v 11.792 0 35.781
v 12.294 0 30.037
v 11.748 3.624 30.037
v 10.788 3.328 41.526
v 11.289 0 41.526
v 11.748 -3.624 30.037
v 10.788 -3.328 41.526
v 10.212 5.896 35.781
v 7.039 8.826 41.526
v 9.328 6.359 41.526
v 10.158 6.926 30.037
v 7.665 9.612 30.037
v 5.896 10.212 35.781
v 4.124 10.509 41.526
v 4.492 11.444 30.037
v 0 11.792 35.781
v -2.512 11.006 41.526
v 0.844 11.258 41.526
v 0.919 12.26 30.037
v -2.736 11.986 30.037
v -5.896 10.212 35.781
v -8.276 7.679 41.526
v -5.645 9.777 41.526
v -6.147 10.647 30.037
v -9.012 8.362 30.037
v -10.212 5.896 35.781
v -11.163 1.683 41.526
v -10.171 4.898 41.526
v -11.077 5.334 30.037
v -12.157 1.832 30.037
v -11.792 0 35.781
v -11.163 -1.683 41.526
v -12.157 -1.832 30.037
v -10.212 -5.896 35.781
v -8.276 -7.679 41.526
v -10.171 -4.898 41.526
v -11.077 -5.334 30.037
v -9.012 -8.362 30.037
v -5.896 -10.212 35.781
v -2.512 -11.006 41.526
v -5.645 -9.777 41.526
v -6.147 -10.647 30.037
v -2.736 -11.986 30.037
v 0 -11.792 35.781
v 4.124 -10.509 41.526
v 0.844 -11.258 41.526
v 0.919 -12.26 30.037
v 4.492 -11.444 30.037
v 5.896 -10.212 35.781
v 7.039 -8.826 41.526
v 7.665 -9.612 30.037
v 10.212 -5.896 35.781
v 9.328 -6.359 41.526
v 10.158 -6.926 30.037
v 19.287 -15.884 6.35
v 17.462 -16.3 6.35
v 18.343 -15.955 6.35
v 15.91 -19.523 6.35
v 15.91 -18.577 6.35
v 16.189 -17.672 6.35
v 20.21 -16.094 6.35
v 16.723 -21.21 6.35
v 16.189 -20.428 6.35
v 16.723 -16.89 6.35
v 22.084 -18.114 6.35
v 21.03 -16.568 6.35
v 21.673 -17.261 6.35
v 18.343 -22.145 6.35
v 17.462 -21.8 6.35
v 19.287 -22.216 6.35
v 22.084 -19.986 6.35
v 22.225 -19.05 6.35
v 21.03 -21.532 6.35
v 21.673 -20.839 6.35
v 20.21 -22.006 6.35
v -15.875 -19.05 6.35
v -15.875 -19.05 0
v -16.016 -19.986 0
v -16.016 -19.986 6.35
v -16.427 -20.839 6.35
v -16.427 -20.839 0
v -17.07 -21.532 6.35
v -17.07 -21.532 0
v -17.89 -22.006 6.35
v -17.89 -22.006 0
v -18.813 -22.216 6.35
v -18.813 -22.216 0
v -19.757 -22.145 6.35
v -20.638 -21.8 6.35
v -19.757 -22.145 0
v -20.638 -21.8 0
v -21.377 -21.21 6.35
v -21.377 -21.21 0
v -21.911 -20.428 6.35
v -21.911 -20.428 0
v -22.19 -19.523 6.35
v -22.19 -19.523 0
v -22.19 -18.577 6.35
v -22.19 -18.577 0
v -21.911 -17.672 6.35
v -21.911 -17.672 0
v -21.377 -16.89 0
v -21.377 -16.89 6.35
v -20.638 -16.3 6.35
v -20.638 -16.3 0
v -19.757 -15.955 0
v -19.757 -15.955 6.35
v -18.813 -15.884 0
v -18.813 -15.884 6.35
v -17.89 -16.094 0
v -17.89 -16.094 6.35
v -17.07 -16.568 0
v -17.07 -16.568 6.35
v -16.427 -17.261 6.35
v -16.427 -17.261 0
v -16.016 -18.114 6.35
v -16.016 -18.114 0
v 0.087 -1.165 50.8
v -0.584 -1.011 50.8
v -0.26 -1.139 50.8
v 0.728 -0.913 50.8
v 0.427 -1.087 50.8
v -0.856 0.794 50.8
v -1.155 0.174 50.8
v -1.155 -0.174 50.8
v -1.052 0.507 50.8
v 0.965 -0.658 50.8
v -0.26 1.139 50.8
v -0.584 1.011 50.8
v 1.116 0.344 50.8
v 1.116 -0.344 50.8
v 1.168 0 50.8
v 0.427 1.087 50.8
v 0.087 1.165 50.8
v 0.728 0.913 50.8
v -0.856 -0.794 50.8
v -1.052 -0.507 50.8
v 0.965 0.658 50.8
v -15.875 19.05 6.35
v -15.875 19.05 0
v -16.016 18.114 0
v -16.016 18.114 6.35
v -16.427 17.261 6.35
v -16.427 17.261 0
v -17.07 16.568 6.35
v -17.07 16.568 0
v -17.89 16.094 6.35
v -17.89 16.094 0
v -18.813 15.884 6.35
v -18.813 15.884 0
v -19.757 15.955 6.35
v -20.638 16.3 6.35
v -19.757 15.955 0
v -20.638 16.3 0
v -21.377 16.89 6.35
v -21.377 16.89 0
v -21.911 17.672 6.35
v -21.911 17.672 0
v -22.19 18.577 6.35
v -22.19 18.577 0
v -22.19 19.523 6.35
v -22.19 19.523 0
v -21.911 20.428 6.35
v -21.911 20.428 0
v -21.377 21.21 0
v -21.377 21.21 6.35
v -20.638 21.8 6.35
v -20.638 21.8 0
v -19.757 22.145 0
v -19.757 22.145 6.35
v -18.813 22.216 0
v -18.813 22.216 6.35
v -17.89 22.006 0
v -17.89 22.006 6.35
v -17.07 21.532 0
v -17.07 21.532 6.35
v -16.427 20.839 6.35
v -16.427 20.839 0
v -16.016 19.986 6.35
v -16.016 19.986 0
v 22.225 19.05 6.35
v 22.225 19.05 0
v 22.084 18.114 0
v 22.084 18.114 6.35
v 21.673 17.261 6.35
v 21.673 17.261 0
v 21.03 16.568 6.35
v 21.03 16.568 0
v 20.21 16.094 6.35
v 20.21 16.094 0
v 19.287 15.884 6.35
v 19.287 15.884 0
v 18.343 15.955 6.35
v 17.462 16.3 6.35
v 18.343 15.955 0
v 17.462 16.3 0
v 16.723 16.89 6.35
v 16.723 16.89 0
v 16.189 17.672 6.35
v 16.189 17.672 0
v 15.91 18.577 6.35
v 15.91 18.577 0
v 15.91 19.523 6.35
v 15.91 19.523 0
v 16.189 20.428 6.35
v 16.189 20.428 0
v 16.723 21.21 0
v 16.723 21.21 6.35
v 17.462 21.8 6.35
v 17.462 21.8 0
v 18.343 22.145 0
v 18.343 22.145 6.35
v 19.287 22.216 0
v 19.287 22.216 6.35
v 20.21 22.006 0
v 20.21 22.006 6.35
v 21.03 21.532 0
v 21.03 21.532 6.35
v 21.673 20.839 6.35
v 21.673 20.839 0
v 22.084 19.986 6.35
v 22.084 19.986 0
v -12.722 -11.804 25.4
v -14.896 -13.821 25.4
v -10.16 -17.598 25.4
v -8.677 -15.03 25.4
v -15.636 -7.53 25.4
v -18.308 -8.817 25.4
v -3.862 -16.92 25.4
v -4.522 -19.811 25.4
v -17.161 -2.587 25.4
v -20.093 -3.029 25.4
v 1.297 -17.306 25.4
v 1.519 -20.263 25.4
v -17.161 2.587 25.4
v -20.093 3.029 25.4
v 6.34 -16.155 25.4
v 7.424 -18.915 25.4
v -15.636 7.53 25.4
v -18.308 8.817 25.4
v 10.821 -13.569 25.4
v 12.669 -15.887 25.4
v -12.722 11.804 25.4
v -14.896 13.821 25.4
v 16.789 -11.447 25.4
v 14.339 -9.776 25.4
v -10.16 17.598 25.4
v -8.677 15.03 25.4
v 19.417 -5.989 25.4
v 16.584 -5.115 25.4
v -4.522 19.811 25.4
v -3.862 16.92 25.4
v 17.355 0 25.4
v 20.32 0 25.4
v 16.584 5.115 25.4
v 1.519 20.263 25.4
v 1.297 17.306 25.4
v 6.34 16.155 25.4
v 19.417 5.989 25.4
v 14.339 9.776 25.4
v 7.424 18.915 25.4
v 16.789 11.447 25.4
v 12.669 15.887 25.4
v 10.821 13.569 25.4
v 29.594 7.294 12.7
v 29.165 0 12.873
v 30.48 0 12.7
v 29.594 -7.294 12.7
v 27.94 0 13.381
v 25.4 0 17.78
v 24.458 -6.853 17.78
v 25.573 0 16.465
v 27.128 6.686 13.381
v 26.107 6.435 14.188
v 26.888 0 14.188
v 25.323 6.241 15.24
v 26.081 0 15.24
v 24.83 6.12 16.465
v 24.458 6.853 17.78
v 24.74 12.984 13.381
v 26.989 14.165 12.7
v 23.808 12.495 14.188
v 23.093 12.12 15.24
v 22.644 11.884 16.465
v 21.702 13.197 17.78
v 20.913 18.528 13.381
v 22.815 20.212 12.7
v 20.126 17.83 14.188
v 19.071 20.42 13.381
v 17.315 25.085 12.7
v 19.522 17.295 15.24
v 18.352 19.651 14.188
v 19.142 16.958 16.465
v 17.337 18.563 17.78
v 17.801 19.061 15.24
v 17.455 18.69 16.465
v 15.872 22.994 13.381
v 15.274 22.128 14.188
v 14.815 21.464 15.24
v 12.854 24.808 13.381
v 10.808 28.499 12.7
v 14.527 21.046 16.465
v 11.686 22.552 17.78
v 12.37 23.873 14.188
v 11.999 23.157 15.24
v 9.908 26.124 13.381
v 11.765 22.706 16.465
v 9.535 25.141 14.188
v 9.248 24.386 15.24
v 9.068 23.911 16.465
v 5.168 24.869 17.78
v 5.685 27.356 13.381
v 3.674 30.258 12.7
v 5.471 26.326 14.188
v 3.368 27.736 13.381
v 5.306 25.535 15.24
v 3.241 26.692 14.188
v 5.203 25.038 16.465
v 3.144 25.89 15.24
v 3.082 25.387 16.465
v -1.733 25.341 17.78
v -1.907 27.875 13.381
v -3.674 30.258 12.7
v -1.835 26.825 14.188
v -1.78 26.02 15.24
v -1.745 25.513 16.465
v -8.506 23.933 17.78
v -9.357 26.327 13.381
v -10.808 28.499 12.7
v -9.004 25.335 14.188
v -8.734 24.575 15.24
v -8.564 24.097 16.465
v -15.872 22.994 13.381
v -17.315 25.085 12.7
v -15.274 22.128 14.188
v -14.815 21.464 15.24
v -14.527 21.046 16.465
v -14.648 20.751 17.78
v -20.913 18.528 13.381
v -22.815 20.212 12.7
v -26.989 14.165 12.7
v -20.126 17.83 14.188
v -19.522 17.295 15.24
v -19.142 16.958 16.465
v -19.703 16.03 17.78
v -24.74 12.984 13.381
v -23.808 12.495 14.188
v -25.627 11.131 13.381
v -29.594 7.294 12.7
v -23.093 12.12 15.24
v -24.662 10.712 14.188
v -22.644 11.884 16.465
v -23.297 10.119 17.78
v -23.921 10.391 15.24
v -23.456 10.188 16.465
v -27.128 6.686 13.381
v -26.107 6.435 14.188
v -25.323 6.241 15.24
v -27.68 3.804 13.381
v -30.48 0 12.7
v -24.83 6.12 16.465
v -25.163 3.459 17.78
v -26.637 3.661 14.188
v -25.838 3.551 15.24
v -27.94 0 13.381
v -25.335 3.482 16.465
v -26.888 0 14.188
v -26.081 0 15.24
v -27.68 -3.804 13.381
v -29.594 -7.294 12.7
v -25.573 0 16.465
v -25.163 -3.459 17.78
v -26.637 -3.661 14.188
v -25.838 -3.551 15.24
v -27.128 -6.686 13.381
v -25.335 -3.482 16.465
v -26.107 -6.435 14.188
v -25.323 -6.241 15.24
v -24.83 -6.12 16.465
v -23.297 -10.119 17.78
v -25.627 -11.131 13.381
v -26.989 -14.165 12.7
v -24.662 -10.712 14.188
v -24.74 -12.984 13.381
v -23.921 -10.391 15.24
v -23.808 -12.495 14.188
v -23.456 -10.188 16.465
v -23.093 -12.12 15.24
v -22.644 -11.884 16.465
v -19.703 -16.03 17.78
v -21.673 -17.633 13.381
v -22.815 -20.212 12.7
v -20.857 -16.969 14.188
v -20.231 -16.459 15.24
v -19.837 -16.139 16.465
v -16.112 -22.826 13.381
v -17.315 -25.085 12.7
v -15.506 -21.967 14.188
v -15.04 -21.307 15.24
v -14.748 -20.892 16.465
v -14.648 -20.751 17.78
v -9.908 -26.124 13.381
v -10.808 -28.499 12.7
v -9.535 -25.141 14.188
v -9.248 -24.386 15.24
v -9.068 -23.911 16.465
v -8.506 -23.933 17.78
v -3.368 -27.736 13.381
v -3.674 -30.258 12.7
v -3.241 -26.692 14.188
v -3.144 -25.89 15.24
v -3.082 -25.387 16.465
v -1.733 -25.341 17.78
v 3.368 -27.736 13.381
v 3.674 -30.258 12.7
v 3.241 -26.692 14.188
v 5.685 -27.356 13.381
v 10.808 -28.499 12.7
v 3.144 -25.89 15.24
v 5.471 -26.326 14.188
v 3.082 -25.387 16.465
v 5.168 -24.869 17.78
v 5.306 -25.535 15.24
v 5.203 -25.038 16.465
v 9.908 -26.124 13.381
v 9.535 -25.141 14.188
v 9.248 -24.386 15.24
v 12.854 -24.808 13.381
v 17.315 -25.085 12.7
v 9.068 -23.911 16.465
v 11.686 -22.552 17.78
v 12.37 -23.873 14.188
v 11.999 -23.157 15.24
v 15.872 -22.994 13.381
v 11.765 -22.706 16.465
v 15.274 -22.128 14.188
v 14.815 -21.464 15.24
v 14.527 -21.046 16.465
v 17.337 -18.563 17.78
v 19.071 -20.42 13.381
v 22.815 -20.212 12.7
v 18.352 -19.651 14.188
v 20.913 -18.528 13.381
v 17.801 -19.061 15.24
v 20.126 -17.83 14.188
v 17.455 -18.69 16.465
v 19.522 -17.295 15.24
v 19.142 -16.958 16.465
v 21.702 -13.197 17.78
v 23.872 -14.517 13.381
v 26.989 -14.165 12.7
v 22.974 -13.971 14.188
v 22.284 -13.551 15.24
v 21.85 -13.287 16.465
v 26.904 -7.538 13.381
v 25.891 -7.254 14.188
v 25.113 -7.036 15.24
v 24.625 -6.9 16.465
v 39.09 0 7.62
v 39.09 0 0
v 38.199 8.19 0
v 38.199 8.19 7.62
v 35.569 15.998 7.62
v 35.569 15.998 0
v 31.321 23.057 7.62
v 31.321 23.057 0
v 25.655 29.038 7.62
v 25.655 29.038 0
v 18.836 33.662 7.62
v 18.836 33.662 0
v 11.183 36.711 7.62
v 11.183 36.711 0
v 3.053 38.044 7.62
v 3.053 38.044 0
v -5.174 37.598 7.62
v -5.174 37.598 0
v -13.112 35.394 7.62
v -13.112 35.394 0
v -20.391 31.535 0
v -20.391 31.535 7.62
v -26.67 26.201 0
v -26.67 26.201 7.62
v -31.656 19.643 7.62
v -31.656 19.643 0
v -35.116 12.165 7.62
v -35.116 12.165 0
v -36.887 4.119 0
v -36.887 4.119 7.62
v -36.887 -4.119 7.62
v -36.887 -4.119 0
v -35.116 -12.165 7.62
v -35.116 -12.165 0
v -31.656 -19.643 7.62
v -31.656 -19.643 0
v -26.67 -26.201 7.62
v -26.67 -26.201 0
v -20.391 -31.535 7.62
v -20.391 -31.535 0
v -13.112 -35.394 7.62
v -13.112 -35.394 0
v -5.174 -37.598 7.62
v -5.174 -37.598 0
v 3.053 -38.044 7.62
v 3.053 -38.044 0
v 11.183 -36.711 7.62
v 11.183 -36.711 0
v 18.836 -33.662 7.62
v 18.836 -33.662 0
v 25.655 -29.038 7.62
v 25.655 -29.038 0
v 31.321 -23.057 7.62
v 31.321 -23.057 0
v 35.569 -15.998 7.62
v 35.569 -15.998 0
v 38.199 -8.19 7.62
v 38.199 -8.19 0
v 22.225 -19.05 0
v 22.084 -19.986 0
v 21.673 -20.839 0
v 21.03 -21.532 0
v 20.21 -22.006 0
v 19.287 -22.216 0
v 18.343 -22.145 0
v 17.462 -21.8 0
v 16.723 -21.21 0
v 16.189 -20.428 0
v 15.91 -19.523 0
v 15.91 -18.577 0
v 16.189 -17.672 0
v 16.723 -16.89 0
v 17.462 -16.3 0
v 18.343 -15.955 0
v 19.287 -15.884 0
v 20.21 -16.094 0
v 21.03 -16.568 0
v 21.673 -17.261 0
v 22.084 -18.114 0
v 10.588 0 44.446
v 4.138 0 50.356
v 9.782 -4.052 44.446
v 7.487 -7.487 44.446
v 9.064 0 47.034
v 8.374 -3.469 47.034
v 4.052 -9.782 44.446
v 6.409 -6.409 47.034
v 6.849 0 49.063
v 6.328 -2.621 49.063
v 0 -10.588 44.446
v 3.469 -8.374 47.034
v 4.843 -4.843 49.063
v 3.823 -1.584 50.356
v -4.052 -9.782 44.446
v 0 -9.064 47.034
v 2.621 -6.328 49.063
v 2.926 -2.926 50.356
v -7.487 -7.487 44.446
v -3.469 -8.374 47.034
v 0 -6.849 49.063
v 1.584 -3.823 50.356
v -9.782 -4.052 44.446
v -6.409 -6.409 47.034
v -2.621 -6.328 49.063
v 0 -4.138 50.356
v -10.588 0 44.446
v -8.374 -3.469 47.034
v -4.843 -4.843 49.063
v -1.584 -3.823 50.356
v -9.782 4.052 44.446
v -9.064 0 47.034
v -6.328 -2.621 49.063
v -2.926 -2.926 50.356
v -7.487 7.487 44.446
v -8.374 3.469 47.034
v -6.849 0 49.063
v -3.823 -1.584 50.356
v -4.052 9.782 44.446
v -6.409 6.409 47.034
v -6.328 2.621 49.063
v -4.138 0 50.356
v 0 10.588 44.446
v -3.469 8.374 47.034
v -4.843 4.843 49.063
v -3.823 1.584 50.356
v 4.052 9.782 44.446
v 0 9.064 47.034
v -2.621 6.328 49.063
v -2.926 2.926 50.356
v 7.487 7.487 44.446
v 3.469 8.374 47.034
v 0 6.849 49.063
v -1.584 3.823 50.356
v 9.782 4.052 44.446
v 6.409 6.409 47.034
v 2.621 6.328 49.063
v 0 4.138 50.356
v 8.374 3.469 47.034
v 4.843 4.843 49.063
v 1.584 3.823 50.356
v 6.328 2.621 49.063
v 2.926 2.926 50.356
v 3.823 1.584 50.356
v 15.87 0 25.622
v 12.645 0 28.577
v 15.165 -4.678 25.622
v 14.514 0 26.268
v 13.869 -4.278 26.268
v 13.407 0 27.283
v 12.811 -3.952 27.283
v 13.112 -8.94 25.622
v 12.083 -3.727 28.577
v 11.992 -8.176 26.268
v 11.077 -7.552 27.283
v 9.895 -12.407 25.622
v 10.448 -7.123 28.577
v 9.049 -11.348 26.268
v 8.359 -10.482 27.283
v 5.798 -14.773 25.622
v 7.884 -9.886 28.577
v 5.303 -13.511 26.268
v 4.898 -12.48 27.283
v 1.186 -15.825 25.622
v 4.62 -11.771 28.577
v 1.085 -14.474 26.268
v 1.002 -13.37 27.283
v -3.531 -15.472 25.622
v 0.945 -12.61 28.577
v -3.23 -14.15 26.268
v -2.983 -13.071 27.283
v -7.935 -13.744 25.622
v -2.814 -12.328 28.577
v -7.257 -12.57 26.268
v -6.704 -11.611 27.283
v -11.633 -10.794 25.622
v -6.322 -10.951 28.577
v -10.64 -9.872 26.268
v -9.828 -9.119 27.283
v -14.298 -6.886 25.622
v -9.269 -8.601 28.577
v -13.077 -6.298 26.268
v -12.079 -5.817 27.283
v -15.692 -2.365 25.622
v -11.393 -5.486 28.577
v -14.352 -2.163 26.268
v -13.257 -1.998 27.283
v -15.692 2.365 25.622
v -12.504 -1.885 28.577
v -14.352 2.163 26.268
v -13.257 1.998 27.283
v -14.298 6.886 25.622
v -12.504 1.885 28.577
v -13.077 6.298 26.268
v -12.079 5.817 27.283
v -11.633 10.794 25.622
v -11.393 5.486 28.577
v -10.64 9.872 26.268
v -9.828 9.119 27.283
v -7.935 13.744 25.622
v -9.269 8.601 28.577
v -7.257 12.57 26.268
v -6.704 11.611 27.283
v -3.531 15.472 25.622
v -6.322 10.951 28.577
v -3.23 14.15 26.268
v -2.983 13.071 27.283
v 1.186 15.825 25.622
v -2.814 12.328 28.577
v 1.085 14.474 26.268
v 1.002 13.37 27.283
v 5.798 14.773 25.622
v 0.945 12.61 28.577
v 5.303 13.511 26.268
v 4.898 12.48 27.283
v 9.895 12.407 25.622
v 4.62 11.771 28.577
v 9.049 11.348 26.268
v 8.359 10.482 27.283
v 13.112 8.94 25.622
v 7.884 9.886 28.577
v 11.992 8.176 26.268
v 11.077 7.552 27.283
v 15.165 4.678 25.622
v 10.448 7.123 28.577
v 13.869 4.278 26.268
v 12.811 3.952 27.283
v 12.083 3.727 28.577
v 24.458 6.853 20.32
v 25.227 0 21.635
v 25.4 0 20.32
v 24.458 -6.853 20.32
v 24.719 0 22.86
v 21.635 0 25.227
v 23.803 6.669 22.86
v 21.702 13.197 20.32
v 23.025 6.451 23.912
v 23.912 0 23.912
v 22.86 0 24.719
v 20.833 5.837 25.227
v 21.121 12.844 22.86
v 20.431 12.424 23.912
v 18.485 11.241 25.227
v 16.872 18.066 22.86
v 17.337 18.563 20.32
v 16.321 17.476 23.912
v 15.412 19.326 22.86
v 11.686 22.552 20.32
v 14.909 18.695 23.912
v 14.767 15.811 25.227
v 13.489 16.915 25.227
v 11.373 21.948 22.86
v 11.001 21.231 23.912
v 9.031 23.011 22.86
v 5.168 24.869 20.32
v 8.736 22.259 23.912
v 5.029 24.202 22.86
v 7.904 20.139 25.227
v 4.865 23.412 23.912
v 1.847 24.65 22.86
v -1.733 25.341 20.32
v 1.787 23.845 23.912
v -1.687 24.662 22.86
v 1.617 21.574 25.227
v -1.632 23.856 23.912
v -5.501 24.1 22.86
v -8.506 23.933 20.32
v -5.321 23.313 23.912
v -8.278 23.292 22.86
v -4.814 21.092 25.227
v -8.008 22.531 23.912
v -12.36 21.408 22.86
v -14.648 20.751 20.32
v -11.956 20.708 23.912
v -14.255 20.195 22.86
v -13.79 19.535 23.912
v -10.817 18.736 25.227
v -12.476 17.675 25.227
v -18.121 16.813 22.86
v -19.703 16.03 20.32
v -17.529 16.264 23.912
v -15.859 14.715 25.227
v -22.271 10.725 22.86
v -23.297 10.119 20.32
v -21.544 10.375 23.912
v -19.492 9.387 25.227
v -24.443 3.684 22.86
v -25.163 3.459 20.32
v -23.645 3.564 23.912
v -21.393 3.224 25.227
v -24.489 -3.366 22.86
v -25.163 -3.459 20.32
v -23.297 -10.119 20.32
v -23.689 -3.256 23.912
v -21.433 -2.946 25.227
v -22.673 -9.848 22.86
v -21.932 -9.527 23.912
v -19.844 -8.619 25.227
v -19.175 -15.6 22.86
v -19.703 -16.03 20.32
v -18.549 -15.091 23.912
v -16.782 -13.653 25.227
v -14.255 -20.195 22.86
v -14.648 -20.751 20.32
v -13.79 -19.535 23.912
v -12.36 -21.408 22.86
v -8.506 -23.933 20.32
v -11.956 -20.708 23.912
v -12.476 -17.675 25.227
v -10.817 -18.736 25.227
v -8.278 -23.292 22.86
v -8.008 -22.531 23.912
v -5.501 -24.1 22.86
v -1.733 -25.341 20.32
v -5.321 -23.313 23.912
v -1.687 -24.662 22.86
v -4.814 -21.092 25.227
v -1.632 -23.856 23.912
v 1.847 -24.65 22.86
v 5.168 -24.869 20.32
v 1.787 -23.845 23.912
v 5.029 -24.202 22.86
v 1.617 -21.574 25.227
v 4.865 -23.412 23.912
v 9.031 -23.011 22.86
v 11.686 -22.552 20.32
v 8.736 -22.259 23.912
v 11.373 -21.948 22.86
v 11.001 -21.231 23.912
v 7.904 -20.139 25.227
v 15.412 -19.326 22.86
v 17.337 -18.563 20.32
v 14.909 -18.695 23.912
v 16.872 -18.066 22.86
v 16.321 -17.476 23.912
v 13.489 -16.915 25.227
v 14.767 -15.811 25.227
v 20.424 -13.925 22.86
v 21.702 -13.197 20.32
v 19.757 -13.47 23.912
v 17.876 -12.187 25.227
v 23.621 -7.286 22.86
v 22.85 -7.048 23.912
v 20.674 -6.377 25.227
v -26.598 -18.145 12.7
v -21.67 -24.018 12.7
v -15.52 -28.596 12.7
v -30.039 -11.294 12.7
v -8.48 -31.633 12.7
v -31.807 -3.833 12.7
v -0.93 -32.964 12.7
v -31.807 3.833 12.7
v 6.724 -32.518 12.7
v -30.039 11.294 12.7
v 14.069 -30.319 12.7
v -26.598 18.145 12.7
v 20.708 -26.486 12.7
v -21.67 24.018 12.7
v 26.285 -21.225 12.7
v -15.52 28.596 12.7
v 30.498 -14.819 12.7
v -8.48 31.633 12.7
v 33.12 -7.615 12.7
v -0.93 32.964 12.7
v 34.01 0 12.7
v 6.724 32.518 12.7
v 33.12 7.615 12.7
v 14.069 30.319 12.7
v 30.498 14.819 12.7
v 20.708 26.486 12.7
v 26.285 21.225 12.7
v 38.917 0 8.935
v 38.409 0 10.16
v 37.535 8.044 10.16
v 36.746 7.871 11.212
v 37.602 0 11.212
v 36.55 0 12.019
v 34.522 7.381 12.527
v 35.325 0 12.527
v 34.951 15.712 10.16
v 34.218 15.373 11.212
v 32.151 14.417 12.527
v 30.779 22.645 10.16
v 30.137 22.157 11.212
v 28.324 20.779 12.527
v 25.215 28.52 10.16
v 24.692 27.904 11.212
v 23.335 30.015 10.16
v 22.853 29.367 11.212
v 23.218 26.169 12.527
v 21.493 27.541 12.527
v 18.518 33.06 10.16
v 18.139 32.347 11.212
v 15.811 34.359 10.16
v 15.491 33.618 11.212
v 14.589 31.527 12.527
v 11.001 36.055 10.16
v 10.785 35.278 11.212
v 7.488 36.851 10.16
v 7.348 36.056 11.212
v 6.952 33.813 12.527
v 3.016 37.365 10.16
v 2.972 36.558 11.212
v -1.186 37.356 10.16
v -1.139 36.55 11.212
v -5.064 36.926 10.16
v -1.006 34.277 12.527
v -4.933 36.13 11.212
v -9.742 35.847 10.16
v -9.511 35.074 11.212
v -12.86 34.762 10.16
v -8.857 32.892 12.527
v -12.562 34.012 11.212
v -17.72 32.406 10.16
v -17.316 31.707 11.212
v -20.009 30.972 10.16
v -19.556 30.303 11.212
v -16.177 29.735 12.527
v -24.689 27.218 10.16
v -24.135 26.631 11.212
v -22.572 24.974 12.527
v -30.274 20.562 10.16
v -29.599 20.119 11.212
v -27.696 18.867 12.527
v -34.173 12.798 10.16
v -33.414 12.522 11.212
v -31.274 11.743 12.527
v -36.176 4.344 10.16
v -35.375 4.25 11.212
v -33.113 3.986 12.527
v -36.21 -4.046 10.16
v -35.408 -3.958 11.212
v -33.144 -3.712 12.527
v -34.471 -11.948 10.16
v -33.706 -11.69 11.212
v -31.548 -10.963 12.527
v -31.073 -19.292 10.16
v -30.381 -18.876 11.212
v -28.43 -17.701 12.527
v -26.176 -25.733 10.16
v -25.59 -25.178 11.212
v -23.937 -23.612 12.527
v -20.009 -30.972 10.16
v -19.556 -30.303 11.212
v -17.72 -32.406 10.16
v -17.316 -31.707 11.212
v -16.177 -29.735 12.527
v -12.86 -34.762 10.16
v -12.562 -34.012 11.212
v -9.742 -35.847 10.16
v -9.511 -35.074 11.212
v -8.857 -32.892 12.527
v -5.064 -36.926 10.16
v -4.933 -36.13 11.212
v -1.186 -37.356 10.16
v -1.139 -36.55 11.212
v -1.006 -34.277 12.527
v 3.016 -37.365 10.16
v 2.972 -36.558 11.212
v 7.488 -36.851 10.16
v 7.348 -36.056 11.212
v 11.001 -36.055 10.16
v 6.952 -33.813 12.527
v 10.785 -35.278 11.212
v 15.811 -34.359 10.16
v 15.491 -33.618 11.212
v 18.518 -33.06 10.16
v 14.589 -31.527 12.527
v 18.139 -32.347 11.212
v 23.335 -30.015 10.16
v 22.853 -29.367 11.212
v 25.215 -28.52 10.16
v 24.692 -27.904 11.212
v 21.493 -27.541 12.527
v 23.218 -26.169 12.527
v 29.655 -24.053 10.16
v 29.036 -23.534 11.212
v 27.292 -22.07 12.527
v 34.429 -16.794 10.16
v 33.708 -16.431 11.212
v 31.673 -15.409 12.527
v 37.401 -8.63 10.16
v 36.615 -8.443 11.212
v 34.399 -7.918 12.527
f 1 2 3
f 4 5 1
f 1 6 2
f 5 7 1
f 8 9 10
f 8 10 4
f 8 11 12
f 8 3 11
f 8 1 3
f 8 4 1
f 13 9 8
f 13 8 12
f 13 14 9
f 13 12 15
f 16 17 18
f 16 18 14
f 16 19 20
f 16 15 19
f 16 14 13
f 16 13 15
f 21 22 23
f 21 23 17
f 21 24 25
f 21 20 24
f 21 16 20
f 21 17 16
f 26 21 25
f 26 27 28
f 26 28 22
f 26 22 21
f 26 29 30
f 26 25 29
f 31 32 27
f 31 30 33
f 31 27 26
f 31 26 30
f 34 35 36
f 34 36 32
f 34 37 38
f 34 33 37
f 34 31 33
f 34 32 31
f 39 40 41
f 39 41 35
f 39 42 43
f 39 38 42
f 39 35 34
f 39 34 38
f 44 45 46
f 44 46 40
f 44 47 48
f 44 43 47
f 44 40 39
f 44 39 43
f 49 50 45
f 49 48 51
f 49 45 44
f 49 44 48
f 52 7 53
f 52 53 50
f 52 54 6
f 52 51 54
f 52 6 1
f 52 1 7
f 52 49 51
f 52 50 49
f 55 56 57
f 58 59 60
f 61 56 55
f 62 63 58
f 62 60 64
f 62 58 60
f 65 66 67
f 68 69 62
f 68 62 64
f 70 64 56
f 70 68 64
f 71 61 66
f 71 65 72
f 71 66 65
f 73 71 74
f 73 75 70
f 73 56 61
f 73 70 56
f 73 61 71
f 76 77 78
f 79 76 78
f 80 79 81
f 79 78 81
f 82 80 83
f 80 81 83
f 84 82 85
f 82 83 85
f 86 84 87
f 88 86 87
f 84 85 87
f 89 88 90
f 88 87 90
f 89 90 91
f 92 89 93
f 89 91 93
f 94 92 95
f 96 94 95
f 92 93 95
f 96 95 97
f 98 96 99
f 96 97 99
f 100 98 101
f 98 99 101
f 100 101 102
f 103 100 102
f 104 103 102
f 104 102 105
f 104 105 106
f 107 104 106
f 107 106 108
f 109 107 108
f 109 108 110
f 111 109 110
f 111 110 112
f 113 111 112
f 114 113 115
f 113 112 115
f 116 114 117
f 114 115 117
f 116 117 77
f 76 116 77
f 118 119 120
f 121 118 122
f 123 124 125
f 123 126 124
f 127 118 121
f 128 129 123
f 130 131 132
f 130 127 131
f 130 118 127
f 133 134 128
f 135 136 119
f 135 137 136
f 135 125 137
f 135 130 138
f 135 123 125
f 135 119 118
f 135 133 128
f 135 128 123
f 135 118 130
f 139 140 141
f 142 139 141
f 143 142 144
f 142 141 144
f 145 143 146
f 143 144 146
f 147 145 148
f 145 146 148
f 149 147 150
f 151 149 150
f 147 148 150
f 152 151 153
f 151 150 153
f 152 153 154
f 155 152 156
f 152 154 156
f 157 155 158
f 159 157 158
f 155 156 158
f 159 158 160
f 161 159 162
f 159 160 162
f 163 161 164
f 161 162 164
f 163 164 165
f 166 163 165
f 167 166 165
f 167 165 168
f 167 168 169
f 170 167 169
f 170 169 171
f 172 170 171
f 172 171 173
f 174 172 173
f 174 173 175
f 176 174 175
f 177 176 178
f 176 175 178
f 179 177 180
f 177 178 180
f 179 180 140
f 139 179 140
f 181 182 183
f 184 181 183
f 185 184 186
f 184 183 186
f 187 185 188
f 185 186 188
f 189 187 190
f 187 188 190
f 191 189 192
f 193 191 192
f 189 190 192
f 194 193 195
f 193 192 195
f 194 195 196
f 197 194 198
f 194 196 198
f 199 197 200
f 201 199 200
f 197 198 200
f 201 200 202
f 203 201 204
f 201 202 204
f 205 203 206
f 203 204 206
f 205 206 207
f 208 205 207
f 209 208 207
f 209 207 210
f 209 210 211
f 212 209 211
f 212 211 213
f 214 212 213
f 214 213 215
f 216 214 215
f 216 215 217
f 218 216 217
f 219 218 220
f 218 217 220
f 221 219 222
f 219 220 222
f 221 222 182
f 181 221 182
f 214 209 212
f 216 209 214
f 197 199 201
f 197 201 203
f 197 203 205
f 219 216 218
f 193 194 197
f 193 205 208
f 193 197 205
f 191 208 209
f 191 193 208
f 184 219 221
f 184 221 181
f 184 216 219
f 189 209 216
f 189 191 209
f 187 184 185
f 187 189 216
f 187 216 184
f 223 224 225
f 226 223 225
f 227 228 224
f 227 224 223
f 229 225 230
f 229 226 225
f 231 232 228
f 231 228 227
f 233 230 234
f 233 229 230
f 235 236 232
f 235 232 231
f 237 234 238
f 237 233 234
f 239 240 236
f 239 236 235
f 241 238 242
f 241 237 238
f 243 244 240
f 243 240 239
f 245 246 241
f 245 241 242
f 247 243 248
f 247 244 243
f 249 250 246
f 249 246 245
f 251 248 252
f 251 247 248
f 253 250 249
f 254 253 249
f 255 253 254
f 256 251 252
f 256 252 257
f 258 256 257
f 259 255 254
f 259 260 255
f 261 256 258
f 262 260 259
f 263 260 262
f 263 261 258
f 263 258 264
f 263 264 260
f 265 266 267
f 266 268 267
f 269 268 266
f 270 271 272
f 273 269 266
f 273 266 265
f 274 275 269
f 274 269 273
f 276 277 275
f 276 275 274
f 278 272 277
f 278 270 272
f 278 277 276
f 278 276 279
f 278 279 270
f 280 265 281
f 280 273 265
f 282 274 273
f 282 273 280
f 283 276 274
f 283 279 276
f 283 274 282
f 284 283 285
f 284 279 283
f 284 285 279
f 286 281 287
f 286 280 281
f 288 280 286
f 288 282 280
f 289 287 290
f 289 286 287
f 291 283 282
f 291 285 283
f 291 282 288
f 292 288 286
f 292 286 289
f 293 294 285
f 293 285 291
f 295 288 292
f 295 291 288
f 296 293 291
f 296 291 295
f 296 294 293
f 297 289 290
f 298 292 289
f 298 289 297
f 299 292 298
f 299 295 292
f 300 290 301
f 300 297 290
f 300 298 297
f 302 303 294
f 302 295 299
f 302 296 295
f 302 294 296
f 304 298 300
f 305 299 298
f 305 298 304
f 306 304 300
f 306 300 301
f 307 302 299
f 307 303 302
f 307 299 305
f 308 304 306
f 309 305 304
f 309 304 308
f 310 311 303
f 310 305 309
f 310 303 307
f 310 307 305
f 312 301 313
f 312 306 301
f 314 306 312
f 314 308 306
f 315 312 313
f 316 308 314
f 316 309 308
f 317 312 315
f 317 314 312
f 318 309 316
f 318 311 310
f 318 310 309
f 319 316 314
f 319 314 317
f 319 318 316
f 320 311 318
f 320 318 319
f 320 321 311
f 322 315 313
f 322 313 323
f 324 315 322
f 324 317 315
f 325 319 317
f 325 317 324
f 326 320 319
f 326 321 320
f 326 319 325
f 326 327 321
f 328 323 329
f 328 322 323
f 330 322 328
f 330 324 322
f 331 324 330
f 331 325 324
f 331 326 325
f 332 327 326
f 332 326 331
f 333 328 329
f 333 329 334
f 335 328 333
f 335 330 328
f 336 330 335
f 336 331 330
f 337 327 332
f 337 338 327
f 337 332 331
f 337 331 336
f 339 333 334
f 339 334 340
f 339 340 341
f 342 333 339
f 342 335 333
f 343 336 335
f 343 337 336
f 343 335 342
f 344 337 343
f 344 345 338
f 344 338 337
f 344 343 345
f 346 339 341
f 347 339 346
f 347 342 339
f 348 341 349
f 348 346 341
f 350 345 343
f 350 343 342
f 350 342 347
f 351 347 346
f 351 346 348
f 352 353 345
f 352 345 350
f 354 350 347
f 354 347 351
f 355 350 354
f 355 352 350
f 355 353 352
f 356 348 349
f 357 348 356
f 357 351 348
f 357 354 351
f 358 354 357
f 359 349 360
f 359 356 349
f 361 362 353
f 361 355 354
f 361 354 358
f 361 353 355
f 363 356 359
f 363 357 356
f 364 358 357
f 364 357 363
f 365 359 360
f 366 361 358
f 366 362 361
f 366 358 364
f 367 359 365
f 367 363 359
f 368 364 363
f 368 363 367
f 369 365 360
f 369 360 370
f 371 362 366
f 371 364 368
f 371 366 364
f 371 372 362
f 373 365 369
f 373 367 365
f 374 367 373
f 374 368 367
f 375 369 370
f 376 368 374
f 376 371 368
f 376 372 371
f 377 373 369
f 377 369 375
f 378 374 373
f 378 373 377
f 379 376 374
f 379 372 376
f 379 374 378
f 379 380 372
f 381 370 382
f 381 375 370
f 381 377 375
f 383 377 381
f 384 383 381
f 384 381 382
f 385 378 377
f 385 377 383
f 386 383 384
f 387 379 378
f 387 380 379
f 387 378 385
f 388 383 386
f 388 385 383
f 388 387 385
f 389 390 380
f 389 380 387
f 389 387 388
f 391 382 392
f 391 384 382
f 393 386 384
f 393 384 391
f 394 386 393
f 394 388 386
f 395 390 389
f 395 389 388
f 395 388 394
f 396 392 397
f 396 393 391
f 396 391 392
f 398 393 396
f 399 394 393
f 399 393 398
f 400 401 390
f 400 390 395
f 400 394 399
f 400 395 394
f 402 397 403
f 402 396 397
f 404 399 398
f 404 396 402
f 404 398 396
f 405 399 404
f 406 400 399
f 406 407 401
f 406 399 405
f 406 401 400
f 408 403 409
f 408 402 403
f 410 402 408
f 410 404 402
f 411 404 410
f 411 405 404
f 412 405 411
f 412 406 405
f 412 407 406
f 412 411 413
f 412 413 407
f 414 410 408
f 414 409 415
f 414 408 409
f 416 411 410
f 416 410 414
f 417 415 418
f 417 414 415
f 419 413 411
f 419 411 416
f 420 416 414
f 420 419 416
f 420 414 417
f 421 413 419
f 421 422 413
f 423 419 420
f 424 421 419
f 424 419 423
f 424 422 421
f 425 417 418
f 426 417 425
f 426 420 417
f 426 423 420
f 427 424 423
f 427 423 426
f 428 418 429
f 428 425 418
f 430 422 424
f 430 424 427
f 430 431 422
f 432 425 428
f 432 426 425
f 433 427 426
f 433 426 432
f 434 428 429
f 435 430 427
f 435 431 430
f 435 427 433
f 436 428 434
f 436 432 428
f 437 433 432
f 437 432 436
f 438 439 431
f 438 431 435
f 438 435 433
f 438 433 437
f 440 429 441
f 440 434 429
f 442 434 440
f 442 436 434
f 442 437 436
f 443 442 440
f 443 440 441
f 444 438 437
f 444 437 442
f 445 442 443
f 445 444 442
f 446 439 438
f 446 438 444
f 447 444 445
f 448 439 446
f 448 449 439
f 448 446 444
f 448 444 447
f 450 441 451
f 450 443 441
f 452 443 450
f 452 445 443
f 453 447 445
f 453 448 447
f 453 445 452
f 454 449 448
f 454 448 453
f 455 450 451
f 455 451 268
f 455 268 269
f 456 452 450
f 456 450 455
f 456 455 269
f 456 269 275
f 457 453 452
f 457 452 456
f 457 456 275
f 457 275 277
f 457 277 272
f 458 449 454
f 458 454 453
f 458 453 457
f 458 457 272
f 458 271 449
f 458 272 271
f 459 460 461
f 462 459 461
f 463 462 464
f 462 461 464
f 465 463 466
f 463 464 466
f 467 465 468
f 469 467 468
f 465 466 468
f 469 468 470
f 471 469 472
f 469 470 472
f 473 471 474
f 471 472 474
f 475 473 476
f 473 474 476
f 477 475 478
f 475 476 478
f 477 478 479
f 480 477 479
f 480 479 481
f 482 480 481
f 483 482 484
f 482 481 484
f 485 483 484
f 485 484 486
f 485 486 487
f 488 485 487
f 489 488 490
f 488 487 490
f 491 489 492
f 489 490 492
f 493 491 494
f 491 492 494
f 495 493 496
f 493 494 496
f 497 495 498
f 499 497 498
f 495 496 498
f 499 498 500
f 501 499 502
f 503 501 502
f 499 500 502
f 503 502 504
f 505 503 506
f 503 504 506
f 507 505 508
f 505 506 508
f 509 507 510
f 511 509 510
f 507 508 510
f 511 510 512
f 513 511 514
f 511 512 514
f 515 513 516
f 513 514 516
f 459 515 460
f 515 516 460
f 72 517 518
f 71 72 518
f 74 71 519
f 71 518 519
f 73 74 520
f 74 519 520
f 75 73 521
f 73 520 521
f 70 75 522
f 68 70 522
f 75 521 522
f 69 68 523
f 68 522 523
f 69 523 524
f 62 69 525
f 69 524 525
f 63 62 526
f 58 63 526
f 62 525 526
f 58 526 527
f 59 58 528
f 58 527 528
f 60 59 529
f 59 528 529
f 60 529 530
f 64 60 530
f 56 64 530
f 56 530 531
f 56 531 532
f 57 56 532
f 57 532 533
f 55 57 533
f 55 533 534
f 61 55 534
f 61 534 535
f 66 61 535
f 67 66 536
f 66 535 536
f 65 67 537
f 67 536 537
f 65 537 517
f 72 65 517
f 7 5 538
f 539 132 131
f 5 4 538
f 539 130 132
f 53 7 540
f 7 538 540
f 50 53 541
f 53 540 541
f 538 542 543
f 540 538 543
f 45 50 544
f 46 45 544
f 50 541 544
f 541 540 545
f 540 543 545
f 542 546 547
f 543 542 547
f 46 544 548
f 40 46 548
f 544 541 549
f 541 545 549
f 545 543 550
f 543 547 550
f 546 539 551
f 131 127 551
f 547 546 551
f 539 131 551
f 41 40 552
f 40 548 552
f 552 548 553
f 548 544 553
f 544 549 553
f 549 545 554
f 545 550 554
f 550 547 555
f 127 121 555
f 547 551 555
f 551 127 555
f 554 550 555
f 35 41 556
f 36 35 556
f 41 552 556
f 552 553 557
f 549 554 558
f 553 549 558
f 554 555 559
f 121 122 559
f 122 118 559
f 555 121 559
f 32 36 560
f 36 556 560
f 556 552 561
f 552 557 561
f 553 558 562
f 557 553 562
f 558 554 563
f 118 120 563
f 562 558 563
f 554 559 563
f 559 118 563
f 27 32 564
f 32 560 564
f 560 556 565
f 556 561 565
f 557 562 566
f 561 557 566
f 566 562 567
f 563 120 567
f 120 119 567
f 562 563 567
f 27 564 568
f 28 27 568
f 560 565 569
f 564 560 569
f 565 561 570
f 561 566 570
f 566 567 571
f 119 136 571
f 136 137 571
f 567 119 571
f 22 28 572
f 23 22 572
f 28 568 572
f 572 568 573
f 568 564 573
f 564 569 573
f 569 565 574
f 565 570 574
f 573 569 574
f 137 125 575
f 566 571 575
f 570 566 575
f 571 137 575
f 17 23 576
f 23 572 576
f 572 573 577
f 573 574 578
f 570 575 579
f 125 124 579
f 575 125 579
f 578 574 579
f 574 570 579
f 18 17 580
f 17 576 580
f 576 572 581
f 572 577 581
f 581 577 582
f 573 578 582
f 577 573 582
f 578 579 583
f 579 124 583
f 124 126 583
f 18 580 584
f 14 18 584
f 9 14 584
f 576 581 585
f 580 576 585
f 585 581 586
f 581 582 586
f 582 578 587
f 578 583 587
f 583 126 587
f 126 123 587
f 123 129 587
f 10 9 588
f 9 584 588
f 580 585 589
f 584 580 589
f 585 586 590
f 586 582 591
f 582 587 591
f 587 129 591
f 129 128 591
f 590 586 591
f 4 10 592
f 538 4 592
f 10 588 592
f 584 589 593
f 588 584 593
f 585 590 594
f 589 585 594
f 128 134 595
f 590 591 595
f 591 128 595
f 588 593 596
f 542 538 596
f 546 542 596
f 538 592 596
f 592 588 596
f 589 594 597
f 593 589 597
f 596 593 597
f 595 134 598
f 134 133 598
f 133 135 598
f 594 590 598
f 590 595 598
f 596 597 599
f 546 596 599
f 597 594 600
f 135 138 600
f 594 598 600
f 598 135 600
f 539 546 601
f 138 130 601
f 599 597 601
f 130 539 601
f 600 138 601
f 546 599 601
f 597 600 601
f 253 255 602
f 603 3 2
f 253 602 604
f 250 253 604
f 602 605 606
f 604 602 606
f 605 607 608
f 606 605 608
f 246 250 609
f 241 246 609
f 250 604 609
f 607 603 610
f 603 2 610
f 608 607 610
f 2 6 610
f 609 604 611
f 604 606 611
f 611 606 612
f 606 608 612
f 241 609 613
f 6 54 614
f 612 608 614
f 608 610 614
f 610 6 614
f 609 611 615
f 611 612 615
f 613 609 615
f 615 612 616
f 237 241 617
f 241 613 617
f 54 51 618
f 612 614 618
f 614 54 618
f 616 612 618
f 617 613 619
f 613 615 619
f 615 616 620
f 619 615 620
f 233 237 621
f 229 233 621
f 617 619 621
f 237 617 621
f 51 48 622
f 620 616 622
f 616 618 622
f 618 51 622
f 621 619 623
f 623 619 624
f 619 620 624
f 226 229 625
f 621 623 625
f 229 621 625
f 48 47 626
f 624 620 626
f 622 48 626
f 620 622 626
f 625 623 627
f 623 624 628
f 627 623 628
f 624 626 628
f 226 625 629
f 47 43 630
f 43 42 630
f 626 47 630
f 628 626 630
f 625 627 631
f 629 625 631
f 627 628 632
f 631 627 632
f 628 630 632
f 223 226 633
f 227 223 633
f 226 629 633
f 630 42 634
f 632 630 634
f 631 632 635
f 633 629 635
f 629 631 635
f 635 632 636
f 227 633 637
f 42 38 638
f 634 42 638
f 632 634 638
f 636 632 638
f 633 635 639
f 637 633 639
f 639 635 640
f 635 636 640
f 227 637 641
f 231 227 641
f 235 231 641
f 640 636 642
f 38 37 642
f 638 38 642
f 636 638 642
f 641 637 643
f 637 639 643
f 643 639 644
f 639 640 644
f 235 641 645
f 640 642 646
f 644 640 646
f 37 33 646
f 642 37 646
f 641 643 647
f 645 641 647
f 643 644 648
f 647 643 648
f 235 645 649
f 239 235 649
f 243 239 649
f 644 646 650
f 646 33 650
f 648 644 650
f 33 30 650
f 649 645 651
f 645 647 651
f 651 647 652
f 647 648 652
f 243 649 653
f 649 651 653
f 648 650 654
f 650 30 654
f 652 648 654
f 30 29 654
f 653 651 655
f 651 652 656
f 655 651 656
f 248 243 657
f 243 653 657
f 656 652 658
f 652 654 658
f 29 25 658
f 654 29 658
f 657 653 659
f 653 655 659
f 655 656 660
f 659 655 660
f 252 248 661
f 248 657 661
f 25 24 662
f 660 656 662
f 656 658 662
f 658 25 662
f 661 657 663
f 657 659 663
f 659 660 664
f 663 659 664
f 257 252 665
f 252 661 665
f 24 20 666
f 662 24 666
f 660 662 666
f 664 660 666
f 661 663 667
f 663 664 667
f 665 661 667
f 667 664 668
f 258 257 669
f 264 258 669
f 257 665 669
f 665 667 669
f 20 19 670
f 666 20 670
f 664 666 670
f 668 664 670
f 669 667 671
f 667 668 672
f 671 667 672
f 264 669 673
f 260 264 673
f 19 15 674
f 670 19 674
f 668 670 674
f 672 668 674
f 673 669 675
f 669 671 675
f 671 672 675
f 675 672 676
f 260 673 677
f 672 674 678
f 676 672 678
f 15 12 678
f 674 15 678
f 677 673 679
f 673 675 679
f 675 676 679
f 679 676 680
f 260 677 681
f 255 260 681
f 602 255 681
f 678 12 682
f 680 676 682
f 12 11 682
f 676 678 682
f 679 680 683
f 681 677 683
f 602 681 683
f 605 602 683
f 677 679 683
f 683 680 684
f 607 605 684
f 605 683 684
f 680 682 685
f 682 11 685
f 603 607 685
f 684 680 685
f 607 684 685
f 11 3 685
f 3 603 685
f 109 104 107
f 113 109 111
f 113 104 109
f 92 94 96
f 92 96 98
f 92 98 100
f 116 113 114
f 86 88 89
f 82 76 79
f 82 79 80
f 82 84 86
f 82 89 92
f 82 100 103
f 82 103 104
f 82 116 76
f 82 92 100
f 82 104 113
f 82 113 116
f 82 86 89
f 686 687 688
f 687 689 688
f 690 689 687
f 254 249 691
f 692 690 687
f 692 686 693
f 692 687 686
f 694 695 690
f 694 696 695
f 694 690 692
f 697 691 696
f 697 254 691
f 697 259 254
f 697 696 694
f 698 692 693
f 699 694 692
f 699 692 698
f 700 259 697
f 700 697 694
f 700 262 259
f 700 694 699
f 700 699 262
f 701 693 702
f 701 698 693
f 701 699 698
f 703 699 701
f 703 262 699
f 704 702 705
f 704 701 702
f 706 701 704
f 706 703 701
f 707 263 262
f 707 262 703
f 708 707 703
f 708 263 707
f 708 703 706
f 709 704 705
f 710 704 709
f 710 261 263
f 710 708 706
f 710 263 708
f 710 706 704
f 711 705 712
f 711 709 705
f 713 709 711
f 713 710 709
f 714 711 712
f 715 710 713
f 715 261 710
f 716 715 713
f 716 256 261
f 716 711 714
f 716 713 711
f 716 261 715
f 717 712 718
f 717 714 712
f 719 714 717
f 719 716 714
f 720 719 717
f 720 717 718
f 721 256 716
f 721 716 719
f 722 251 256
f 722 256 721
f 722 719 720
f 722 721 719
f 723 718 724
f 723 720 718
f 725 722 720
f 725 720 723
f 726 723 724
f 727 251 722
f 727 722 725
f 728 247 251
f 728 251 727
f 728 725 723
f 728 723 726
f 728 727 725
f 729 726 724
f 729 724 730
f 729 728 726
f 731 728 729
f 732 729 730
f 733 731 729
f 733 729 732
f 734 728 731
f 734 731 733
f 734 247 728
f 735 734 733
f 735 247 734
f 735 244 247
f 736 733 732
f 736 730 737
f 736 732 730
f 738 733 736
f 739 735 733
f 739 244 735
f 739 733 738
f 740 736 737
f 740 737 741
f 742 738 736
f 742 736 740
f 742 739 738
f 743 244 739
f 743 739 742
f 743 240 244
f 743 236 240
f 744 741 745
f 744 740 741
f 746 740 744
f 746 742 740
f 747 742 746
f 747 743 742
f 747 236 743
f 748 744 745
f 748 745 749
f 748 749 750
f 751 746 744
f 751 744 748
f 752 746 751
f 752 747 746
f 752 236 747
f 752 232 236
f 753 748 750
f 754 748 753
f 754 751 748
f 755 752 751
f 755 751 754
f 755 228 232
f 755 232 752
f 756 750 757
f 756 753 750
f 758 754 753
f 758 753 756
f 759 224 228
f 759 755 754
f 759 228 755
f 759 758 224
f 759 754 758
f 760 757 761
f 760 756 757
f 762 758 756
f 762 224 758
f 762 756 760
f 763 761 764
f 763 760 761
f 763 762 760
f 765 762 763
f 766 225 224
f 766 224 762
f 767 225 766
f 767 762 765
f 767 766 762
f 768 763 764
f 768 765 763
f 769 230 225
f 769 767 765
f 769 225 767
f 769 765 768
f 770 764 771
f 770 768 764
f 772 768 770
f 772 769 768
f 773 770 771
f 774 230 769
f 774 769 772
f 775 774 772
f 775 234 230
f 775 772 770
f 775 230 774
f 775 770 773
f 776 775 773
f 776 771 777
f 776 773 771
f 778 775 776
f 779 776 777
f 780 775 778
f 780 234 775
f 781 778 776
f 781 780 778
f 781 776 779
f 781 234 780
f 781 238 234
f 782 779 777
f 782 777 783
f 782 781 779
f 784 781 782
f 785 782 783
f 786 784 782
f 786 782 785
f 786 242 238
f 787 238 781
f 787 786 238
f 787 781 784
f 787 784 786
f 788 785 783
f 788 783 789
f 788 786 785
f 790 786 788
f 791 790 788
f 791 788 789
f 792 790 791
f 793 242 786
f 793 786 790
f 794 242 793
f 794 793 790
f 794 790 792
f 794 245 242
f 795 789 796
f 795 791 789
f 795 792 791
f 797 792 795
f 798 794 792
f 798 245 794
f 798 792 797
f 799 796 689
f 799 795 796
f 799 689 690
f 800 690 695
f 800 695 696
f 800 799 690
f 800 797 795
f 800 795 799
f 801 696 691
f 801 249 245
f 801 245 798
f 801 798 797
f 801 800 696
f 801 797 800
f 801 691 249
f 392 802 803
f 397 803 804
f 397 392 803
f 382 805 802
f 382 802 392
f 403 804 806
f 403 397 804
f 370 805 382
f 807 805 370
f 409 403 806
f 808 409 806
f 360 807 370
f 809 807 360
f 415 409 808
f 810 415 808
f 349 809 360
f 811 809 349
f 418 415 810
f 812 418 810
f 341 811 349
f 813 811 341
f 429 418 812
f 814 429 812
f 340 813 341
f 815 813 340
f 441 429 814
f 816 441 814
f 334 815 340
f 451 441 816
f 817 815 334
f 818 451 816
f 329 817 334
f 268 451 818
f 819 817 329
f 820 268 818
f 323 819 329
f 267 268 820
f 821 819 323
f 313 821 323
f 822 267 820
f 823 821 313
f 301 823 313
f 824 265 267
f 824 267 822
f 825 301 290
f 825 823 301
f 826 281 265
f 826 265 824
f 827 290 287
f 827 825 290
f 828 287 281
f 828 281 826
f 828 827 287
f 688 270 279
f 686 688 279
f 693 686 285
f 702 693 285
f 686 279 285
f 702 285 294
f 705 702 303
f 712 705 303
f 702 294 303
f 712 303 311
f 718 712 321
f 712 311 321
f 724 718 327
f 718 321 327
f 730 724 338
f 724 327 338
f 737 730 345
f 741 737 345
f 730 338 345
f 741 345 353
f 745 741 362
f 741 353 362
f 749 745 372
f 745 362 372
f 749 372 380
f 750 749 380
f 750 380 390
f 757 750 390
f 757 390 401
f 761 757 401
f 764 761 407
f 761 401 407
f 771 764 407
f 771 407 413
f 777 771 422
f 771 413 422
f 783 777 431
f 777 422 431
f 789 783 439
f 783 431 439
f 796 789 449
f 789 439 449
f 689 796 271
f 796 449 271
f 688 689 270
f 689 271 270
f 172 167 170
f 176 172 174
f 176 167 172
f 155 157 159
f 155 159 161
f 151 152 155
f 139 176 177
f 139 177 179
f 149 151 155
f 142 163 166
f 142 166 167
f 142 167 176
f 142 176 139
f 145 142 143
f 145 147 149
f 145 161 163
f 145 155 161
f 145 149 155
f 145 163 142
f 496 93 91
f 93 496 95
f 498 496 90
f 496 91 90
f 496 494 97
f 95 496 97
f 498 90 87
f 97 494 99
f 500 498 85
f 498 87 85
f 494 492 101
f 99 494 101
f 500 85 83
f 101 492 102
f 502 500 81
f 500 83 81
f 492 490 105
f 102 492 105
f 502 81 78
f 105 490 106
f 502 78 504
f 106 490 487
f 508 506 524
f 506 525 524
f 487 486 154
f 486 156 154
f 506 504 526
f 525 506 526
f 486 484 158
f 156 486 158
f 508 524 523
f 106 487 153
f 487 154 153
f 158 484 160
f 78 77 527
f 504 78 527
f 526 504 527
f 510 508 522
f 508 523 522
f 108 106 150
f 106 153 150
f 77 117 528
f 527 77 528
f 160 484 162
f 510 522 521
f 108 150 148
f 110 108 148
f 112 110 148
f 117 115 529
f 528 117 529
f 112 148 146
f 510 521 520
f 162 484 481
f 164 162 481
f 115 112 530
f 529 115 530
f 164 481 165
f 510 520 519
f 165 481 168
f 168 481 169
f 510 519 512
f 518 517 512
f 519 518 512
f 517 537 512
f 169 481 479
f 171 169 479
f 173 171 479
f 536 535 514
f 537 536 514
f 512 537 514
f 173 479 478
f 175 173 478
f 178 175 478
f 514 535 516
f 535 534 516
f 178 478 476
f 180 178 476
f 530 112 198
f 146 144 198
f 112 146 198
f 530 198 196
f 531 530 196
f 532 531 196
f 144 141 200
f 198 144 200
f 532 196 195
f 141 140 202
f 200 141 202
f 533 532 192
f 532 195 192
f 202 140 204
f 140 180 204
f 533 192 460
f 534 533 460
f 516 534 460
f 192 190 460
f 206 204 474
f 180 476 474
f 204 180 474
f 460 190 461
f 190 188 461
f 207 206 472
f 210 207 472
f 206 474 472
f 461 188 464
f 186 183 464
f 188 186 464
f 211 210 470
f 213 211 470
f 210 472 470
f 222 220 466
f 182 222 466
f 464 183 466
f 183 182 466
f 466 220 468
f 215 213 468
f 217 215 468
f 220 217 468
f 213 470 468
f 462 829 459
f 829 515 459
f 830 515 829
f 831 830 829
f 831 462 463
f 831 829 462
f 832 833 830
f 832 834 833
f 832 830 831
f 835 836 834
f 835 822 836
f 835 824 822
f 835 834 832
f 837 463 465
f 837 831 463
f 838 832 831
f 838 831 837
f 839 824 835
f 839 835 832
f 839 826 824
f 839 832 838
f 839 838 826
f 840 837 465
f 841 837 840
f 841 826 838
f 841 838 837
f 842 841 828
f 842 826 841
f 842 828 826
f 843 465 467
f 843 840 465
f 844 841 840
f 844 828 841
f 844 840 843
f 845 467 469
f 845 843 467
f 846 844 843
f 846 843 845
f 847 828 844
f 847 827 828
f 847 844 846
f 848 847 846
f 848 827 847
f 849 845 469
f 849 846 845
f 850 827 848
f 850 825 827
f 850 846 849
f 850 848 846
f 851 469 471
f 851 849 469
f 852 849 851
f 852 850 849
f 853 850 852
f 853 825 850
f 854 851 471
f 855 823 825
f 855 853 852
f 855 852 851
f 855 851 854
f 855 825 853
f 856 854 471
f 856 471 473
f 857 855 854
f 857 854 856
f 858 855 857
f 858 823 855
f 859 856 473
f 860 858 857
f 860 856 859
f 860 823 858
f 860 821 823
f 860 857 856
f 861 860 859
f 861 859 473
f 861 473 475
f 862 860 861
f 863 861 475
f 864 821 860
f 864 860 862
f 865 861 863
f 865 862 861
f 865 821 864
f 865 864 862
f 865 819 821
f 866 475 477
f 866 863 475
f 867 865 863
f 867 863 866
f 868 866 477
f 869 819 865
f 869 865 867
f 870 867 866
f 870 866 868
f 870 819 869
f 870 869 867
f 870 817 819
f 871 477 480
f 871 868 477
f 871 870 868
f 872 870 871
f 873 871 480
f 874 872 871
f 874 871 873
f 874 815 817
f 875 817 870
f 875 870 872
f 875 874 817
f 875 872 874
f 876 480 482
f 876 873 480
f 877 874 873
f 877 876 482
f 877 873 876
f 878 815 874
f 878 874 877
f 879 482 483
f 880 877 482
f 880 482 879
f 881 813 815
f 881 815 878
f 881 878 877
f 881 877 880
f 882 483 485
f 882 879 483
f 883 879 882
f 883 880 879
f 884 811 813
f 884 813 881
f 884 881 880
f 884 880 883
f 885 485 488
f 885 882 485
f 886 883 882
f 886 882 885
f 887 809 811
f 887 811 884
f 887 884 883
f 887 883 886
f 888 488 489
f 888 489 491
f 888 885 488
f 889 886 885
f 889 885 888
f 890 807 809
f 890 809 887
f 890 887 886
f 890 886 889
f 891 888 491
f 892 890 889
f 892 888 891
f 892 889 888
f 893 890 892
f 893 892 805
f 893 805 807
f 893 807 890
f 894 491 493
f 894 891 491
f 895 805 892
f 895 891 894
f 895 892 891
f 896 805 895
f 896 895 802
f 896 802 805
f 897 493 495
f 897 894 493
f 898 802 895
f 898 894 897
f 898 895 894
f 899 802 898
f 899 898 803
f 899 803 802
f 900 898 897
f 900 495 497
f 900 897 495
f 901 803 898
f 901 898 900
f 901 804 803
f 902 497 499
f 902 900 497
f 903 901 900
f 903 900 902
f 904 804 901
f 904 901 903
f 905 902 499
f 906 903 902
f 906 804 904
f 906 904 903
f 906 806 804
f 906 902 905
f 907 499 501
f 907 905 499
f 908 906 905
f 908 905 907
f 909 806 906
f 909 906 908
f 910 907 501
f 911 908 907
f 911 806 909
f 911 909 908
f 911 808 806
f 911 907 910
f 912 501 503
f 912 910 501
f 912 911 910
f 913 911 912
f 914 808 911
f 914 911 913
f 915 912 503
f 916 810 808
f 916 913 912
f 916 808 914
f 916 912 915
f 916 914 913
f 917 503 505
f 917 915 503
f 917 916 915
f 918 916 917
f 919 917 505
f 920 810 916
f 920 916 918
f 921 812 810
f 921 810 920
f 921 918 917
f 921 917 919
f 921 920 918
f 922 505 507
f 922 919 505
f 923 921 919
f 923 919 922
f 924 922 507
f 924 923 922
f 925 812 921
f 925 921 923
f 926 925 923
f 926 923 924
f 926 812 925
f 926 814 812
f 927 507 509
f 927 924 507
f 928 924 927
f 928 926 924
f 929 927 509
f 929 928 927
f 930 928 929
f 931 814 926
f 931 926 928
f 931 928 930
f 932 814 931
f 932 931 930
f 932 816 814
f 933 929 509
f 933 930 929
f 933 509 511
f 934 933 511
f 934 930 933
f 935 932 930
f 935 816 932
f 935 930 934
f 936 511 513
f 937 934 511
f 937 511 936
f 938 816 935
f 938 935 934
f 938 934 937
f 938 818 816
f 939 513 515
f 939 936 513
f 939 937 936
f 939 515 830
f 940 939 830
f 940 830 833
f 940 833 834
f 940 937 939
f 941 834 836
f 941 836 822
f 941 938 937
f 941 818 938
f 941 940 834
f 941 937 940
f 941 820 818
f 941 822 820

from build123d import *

# Parameters (mm, degrees)
F0_R     = 38.1
F1_DEPTH = 12.7
F2_R     = 3.175
F3_DEPTH = 6.35
F4_R     = 25.4
F5_DEPTH = 12.7
F6_R     = 12.7
F7_DEPTH = 25.4
F7_TAPER = 5
F8_R     = 5.08
F9_R     = 10.16


with BuildPart() as f1:
    # F0 (on Top) → F1 (new body)
    with BuildSketch(Plane.XY):
        with Locations((0.9899509557, 0)):
            Circle(F0_R)
    extrude(amount=F1_DEPTH)

    # F2 (on face) → F3 (cut)
    with BuildSketch(Plane(origin=(0, 0, 0), x_dir=(1, 0, 0), z_dir=(0, 0, -1))):
        with Locations((-19.05, -19.05)):
            Circle(F2_R)
        with Locations((19.05, -19.05)):
            Circle(F2_R)
        with Locations((19.05, 19.05)):
            Circle(F2_R)
        with Locations((-19.05, 19.05)):
            Circle(F2_R)
    extrude(amount=-F3_DEPTH, mode=Mode.SUBTRACT)

    # F4 (on face) → F5 (join)
    with BuildSketch(Plane.XY.offset(12.7)):
        Circle(F4_R)
    extrude(amount=F5_DEPTH)

    # F6 (on face) → F7 (join)
    with BuildSketch(Plane.XY.offset(25.4)):
        Circle(F6_R)
    extrude(amount=F7_DEPTH, taper=F7_TAPER)

    # F8
    f8_edges = [f1.edges().sort_by_distance(p)[0] for p in [
        (-37.110049, 0, 12.7),
        (-25.4, 0, 12.7),
        (-25.4, 0, 25.4),
        (-12.7, 0, 25.4),
    ]]
    fillet(f8_edges, radius=F8_R)

    # F9
    f9_edges = [f1.edges().sort_by_distance(p)[0] for p in [
        (-10.477788, 0, 50.8),
    ]]
    fillet(f9_edges, radius=F9_R)


solid = f1.part
